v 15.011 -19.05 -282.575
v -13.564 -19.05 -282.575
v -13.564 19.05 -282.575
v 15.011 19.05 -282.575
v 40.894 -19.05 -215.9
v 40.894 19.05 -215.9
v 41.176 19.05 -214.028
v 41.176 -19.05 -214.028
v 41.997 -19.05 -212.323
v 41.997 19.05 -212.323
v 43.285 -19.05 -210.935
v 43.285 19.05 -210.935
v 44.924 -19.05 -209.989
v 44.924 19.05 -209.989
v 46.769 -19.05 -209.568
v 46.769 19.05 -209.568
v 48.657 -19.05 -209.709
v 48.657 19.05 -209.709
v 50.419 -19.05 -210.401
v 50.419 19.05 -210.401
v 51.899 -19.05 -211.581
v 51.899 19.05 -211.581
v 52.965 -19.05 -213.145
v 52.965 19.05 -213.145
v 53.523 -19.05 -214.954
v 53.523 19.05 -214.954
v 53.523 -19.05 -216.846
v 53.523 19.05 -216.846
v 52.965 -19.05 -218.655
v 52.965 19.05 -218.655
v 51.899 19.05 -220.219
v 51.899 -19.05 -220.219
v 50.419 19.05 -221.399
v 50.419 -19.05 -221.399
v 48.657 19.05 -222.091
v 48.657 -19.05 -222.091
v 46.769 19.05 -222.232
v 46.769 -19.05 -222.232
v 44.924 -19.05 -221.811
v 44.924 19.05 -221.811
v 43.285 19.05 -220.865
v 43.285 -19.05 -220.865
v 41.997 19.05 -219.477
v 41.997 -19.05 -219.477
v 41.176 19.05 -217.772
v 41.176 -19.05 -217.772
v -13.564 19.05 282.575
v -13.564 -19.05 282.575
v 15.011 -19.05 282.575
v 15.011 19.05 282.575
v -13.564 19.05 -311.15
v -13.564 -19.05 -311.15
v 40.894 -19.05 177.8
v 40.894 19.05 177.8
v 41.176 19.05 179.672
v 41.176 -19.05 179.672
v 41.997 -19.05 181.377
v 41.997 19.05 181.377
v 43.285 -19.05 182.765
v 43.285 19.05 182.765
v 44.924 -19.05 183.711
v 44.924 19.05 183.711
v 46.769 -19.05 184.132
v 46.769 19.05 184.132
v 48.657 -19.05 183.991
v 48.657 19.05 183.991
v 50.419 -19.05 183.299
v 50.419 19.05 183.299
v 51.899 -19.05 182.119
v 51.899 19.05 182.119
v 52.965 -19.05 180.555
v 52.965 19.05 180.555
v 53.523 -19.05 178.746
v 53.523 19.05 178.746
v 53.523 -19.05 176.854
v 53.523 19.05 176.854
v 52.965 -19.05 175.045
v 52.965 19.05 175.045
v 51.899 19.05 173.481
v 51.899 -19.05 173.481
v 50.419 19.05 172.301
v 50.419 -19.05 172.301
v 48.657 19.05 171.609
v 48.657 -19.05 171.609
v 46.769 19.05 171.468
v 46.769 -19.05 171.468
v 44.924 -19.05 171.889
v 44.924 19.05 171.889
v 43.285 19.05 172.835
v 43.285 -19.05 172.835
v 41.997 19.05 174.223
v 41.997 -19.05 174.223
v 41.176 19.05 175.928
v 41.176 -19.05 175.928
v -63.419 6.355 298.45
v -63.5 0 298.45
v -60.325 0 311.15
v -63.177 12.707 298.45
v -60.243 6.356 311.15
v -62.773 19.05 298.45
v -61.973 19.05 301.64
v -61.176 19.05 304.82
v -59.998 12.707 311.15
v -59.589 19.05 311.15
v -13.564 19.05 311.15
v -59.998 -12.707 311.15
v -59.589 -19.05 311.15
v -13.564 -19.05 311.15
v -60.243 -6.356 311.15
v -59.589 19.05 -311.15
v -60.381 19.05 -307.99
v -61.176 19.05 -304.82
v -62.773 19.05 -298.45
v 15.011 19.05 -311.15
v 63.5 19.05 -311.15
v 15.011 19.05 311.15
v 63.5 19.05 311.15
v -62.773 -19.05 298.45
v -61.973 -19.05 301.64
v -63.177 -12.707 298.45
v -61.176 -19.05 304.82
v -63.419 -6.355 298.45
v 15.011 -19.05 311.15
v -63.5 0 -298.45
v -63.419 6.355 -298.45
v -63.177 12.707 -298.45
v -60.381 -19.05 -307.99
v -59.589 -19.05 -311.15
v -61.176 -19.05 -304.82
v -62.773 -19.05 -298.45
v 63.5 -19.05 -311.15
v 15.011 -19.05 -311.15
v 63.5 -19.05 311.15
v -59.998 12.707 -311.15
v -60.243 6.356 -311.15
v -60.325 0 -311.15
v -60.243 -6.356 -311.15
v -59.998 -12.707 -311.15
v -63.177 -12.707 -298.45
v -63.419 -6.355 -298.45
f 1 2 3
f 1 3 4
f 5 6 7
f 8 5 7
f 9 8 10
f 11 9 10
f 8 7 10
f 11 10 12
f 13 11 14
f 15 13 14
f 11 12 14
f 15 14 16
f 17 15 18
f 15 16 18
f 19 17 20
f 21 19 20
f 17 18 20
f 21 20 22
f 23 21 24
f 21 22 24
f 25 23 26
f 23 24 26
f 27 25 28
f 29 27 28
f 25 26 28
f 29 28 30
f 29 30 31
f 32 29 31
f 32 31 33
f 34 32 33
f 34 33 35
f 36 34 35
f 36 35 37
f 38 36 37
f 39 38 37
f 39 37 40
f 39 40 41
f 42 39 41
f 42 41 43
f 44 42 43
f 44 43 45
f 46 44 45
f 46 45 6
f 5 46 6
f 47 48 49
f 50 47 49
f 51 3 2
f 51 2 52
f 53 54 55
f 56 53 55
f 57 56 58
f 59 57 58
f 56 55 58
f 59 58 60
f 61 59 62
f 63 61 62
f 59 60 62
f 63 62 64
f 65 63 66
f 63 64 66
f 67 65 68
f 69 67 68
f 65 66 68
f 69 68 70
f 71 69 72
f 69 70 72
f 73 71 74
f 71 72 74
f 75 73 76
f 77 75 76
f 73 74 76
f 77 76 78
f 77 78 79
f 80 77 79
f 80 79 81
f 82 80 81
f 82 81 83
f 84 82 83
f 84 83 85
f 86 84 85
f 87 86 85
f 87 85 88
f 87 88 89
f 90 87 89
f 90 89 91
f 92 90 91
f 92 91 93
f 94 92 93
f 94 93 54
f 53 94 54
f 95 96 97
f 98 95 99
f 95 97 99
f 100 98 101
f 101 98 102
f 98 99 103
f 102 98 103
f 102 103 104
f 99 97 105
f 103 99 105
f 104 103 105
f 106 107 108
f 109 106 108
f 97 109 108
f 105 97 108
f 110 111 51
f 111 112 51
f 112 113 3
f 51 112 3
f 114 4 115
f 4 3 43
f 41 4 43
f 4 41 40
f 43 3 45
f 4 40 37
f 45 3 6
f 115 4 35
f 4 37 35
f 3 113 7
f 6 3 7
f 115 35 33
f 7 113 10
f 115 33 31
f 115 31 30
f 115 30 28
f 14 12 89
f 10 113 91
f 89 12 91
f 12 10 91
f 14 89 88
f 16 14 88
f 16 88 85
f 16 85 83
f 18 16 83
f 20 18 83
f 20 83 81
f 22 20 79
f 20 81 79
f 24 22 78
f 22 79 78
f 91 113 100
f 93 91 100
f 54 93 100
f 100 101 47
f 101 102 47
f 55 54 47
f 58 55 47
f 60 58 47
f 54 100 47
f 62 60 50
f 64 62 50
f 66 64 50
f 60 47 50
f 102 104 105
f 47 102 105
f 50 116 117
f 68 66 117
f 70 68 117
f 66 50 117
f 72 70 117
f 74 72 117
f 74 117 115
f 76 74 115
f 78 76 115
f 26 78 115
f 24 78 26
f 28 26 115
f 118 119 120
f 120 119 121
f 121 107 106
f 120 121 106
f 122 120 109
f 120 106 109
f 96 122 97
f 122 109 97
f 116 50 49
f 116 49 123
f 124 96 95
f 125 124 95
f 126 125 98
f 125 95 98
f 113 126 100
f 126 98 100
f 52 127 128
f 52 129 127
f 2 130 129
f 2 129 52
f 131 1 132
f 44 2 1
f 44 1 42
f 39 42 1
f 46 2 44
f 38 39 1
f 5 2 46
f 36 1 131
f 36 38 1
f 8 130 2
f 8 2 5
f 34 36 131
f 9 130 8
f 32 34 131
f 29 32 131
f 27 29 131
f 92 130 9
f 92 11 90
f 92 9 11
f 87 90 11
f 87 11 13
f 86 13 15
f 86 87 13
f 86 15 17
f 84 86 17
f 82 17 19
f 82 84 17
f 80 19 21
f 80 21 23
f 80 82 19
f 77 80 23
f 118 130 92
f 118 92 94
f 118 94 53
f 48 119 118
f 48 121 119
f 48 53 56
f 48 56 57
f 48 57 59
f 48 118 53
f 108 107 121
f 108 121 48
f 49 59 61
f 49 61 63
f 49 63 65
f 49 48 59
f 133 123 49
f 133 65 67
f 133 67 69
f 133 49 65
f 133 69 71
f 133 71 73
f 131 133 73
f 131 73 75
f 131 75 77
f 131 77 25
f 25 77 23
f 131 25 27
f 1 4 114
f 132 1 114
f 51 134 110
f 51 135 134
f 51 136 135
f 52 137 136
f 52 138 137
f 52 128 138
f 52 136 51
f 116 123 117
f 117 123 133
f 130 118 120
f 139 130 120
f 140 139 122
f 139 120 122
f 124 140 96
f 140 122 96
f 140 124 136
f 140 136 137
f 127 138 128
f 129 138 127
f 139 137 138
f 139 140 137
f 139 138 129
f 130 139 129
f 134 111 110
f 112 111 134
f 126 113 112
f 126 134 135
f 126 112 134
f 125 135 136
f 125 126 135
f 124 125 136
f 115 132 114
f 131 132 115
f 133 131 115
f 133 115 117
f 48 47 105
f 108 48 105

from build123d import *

# Parameters (mm, degrees)
F0_W        = 127
F0_H        = 622.3
F1_DEPTH    = 19.05
F3_DEPTH    = 622.301
F5_D        = 12.7
F6_W        = 28.575
F6_H        = 28.575
F7_DEPTH    = 38.101
F8_C1_SIZE2 = 12.7
F8_C1_SIZE  = 3.175
F8_C2_SIZE2 = 3.175
F8_C2_SIZE  = 12.7


# Not quite as in the source:
# - a length typed as a fraction of an inch, garbled in the dataset ("3 / 203.2 mm" for 3/8 in), is restored
# - a pattern or mirror of a feature is missing from the dataset's text; its kind, count and spacing are read off the source's solid


with BuildPart() as f1:
    # F0 (on Front) → F1 (new body, symmetric)
    with BuildSketch(Plane.XZ):
        Rectangle(F0_W, F0_H)
    extrude(amount=F1_DEPTH, both=True)

    # F2 (on face) → F3 (cut, through all)
    with BuildSketch(Plane.XY.offset(311.15)):
        with BuildLine():
            ThreePointArc((-63.5, 2.159e-07), (-63.3181995898, 9.5319324627), (-62.773062814, 19.05))
            Line((-62.773062814, 19.05), (-63.5, 19.05))
            Line((-63.5, 19.05), (-63.5, 2.159e-07))
        make_face()
        with BuildLine():
            Line((-63.5, -19.05), (-62.773062814, -19.05))
            ThreePointArc((-62.773062814, -19.05), (-63.318199598, -9.531932247), (-63.5, 2.159e-07))
            Line((-63.5, 2.159e-07), (-63.5, -19.05))
        make_face()
    extrude(amount=-F3_DEPTH, mode=Mode.SUBTRACT)

    # F5 (through all)
    with Locations(Plane.XZ.offset(19.05)):
        with Locations((47.244, 177.8), (47.244, -215.9)):
            Hole(F5_D / 2)

    # F6 (on face) → F7 (cut, through all)
    with BuildSketch(Plane.XZ.offset(19.05)):
        with Locations((0.7239, 296.8625)):
            Rectangle(F6_W, F6_H)
    f7 = extrude(amount=-F7_DEPTH, mode=Mode.SUBTRACT)

    # F7_copies: F7 across plane
    add(f7.mirror(Plane(origin=(0, 0, 0), x_dir=(-1, 0, 0), z_dir=(0, 0, -1))), mode=Mode.SUBTRACT)

    # F8: chamfer of 12.7 x 3.175 on 2 edges, made by hand

    # F8_c1
    f8_c1_edges = [f1.edges().sort_by_distance(p)[0] for p in [
        (-63.5, 0, -311.15),
    ]]
    f8_c1_side = f1.faces().sort_by_distance((-63.4365, 0, -311.15))[0]
    chamfer(f8_c1_edges, length=F8_C1_SIZE, length2=F8_C1_SIZE2, reference=f8_c1_side)

    # F8_c2
    f8_c2_edges = [f1.edges().sort_by_distance(p)[0] for p in [
        (-63.5, 0, 311.15),
    ]]
    f8_c2_side = f1.faces().sort_by_distance((-63.5, 0, 311.0865))[0]
    chamfer(f8_c2_edges, length=F8_C2_SIZE, length2=F8_C2_SIZE2, reference=f8_c2_side)


solid = f1.part
